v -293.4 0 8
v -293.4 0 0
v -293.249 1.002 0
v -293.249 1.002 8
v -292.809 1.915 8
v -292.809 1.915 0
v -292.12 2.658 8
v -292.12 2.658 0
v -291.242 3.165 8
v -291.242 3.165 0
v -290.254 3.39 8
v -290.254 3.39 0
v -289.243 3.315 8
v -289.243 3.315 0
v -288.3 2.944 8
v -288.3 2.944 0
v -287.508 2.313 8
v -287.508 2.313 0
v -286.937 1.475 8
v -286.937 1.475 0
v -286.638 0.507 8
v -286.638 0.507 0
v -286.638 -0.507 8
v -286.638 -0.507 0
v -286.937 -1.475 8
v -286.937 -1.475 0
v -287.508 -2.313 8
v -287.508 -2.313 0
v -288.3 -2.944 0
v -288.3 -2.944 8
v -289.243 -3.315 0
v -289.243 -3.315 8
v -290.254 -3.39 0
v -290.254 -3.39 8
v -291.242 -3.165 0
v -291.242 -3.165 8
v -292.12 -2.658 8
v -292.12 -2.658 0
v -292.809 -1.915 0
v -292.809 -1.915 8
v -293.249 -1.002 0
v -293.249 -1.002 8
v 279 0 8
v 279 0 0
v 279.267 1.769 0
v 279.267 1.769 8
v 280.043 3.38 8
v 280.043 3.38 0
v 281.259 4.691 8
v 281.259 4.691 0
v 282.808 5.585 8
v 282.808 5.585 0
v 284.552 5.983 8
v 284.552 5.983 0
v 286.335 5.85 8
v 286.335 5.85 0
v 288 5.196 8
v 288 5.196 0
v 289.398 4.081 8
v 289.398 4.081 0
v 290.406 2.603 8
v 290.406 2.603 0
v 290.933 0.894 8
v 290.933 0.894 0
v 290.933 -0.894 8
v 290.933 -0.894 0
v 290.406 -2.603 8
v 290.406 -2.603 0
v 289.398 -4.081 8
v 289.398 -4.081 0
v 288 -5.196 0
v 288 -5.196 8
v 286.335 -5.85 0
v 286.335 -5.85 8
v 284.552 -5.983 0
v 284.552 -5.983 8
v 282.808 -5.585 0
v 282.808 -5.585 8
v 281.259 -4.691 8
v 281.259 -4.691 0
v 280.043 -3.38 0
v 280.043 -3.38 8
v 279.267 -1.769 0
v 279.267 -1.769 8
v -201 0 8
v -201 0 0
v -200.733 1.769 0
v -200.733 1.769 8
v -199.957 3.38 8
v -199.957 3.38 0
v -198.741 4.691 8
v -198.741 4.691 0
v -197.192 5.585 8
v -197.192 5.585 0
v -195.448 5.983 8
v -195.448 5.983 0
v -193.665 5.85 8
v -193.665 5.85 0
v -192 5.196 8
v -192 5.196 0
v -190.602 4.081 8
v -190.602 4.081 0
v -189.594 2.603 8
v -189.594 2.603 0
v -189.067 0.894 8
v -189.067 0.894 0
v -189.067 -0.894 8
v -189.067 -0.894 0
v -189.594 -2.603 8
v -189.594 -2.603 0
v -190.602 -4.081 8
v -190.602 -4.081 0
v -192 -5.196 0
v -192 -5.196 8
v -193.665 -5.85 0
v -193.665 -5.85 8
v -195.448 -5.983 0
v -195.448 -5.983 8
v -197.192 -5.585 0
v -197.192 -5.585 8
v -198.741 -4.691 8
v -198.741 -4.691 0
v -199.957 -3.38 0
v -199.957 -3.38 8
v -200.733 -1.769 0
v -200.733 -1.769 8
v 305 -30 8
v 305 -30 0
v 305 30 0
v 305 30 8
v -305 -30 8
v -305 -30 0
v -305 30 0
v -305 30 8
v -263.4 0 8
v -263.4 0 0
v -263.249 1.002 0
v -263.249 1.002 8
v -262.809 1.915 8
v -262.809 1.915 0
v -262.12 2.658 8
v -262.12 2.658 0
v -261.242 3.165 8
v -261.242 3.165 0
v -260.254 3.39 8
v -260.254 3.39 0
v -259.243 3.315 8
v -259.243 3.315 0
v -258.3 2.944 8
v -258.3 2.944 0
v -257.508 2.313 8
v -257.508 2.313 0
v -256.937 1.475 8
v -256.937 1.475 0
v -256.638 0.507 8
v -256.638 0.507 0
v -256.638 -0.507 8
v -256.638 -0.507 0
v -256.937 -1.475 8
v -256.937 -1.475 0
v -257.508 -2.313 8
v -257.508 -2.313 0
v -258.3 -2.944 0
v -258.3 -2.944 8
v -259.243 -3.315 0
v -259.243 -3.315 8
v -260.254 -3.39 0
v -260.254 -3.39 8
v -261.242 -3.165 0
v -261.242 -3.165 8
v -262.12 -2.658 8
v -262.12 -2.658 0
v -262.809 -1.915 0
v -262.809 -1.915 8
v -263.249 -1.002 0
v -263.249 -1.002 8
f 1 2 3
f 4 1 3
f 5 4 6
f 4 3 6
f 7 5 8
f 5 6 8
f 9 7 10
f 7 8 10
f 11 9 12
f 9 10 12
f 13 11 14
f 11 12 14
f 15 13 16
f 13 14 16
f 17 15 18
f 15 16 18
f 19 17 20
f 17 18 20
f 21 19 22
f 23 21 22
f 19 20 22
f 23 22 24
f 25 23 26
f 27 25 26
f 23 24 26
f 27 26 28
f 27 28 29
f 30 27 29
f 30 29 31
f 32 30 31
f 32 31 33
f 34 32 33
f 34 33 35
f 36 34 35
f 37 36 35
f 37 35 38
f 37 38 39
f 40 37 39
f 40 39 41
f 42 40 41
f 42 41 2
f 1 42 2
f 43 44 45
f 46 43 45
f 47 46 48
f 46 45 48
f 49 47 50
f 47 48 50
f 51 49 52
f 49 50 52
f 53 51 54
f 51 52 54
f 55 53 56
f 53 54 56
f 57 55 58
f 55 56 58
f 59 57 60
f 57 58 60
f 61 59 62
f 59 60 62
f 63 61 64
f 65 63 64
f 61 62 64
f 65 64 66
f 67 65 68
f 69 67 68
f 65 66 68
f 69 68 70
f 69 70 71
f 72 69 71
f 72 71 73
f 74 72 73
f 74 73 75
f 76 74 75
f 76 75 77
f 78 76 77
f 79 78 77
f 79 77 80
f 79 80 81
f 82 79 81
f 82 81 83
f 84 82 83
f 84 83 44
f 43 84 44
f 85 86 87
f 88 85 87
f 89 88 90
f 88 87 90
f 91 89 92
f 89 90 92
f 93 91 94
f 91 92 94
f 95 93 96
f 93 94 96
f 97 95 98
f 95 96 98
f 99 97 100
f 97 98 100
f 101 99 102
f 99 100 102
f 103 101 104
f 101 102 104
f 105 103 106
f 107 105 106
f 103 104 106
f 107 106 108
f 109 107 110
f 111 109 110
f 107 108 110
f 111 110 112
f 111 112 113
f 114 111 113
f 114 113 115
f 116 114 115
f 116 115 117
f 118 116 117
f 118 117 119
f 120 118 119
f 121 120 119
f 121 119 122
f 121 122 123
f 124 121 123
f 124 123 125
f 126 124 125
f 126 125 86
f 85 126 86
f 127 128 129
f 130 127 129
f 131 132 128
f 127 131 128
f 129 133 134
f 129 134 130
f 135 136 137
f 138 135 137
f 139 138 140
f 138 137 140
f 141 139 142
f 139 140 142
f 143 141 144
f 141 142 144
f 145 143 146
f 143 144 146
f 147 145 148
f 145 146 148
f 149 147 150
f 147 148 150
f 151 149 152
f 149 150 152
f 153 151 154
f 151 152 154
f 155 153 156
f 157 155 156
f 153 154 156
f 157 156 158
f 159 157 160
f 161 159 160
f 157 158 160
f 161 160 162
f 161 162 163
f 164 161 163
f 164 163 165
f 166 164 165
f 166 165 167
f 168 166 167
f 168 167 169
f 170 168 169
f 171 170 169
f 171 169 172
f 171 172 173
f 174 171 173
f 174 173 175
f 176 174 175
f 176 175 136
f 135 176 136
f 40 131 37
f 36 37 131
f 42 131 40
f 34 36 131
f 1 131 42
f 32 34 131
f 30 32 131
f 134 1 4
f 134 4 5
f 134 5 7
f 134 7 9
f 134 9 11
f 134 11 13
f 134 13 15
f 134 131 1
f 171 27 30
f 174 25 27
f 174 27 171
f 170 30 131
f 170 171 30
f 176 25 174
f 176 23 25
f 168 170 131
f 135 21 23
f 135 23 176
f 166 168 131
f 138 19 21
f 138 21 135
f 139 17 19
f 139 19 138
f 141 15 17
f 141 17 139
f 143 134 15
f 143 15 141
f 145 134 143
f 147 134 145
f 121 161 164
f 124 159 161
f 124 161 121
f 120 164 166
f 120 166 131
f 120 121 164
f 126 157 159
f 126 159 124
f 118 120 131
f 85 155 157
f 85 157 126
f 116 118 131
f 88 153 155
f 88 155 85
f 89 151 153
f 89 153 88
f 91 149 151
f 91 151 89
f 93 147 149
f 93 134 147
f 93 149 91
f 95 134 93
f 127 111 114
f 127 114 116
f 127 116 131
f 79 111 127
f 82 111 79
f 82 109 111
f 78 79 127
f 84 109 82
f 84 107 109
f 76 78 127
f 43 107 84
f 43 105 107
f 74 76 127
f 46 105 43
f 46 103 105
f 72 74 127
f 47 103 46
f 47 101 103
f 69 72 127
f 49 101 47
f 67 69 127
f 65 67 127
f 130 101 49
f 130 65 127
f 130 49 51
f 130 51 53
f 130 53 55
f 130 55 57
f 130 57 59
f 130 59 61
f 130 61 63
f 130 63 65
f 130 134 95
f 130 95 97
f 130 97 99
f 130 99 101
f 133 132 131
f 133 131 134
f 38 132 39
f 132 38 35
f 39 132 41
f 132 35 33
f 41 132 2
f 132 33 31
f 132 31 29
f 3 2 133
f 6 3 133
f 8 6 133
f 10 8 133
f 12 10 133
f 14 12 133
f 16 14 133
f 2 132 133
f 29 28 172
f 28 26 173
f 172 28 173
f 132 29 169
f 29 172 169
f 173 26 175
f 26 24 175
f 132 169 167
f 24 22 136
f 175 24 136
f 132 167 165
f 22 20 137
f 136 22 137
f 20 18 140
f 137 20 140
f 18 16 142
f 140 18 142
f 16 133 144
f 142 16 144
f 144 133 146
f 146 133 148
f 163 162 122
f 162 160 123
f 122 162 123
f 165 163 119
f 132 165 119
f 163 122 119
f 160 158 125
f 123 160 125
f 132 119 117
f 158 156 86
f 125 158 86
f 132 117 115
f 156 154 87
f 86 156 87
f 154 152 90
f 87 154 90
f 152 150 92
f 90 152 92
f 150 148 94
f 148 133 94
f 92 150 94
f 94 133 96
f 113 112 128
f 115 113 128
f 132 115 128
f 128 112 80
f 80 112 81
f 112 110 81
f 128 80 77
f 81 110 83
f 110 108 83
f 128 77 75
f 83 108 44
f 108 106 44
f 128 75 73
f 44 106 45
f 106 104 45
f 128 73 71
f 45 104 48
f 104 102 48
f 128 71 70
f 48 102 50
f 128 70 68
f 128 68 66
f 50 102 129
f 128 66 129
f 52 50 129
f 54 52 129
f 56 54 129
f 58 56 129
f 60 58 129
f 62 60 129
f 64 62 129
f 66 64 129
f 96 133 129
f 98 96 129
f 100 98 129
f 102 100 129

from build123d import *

# Parameters (mm, degrees)
SKETCH_1_W             = 610
SKETCH_1_H             = 60
EXTRUDE_1_DEPTH        = 8
MM_1_D                 = 12
PATTERN_LINEAR_1_COUNT = 2
PATTERN_LINEAR_1_PITCH = 480
MM_2_D                 = 6.8
PATTERN_LINEAR_2_COUNT = 2
PATTERN_LINEAR_2_PITCH = 30


with BuildPart() as part:
    # 草图1 → 凸台-拉伸1 (new body)
    with BuildSketch(Plane.XY):
        Rectangle(SKETCH_1_W, SKETCH_1_H)
    extrude(amount=EXTRUDE_1_DEPTH)

    # 大小mm 暗销孔1 (through all)
    with Locations(Plane(origin=(285, 0, 8), x_dir=(1, 0, 0), z_dir=(0, 0, 1))):
        with Locations((0, 0)):
            mm_1 = Hole(MM_1_D / 2)

    # 阵列(线性)1: 大小mm 暗销孔1 ×2
    with Locations(*[(-i * PATTERN_LINEAR_1_PITCH, 0, 0) for i in range(1, PATTERN_LINEAR_1_COUNT)]):
        add(mm_1, mode=Mode.SUBTRACT)

    # 大小mm 暗销孔2 (through all)
    with Locations(Plane(origin=(-290, 0, 8), x_dir=(1, 0, 0), z_dir=(0, 0, 1))):
        with Locations((0, 0)):
            mm_2 = Hole(MM_2_D / 2)

    # 阵列(线性)2: 大小mm 暗销孔2 ×2
    with Locations(*[(i * PATTERN_LINEAR_2_PITCH, 0, 0) for i in range(1, PATTERN_LINEAR_2_COUNT)]):
        add(mm_2, mode=Mode.SUBTRACT)


solid = part.part
